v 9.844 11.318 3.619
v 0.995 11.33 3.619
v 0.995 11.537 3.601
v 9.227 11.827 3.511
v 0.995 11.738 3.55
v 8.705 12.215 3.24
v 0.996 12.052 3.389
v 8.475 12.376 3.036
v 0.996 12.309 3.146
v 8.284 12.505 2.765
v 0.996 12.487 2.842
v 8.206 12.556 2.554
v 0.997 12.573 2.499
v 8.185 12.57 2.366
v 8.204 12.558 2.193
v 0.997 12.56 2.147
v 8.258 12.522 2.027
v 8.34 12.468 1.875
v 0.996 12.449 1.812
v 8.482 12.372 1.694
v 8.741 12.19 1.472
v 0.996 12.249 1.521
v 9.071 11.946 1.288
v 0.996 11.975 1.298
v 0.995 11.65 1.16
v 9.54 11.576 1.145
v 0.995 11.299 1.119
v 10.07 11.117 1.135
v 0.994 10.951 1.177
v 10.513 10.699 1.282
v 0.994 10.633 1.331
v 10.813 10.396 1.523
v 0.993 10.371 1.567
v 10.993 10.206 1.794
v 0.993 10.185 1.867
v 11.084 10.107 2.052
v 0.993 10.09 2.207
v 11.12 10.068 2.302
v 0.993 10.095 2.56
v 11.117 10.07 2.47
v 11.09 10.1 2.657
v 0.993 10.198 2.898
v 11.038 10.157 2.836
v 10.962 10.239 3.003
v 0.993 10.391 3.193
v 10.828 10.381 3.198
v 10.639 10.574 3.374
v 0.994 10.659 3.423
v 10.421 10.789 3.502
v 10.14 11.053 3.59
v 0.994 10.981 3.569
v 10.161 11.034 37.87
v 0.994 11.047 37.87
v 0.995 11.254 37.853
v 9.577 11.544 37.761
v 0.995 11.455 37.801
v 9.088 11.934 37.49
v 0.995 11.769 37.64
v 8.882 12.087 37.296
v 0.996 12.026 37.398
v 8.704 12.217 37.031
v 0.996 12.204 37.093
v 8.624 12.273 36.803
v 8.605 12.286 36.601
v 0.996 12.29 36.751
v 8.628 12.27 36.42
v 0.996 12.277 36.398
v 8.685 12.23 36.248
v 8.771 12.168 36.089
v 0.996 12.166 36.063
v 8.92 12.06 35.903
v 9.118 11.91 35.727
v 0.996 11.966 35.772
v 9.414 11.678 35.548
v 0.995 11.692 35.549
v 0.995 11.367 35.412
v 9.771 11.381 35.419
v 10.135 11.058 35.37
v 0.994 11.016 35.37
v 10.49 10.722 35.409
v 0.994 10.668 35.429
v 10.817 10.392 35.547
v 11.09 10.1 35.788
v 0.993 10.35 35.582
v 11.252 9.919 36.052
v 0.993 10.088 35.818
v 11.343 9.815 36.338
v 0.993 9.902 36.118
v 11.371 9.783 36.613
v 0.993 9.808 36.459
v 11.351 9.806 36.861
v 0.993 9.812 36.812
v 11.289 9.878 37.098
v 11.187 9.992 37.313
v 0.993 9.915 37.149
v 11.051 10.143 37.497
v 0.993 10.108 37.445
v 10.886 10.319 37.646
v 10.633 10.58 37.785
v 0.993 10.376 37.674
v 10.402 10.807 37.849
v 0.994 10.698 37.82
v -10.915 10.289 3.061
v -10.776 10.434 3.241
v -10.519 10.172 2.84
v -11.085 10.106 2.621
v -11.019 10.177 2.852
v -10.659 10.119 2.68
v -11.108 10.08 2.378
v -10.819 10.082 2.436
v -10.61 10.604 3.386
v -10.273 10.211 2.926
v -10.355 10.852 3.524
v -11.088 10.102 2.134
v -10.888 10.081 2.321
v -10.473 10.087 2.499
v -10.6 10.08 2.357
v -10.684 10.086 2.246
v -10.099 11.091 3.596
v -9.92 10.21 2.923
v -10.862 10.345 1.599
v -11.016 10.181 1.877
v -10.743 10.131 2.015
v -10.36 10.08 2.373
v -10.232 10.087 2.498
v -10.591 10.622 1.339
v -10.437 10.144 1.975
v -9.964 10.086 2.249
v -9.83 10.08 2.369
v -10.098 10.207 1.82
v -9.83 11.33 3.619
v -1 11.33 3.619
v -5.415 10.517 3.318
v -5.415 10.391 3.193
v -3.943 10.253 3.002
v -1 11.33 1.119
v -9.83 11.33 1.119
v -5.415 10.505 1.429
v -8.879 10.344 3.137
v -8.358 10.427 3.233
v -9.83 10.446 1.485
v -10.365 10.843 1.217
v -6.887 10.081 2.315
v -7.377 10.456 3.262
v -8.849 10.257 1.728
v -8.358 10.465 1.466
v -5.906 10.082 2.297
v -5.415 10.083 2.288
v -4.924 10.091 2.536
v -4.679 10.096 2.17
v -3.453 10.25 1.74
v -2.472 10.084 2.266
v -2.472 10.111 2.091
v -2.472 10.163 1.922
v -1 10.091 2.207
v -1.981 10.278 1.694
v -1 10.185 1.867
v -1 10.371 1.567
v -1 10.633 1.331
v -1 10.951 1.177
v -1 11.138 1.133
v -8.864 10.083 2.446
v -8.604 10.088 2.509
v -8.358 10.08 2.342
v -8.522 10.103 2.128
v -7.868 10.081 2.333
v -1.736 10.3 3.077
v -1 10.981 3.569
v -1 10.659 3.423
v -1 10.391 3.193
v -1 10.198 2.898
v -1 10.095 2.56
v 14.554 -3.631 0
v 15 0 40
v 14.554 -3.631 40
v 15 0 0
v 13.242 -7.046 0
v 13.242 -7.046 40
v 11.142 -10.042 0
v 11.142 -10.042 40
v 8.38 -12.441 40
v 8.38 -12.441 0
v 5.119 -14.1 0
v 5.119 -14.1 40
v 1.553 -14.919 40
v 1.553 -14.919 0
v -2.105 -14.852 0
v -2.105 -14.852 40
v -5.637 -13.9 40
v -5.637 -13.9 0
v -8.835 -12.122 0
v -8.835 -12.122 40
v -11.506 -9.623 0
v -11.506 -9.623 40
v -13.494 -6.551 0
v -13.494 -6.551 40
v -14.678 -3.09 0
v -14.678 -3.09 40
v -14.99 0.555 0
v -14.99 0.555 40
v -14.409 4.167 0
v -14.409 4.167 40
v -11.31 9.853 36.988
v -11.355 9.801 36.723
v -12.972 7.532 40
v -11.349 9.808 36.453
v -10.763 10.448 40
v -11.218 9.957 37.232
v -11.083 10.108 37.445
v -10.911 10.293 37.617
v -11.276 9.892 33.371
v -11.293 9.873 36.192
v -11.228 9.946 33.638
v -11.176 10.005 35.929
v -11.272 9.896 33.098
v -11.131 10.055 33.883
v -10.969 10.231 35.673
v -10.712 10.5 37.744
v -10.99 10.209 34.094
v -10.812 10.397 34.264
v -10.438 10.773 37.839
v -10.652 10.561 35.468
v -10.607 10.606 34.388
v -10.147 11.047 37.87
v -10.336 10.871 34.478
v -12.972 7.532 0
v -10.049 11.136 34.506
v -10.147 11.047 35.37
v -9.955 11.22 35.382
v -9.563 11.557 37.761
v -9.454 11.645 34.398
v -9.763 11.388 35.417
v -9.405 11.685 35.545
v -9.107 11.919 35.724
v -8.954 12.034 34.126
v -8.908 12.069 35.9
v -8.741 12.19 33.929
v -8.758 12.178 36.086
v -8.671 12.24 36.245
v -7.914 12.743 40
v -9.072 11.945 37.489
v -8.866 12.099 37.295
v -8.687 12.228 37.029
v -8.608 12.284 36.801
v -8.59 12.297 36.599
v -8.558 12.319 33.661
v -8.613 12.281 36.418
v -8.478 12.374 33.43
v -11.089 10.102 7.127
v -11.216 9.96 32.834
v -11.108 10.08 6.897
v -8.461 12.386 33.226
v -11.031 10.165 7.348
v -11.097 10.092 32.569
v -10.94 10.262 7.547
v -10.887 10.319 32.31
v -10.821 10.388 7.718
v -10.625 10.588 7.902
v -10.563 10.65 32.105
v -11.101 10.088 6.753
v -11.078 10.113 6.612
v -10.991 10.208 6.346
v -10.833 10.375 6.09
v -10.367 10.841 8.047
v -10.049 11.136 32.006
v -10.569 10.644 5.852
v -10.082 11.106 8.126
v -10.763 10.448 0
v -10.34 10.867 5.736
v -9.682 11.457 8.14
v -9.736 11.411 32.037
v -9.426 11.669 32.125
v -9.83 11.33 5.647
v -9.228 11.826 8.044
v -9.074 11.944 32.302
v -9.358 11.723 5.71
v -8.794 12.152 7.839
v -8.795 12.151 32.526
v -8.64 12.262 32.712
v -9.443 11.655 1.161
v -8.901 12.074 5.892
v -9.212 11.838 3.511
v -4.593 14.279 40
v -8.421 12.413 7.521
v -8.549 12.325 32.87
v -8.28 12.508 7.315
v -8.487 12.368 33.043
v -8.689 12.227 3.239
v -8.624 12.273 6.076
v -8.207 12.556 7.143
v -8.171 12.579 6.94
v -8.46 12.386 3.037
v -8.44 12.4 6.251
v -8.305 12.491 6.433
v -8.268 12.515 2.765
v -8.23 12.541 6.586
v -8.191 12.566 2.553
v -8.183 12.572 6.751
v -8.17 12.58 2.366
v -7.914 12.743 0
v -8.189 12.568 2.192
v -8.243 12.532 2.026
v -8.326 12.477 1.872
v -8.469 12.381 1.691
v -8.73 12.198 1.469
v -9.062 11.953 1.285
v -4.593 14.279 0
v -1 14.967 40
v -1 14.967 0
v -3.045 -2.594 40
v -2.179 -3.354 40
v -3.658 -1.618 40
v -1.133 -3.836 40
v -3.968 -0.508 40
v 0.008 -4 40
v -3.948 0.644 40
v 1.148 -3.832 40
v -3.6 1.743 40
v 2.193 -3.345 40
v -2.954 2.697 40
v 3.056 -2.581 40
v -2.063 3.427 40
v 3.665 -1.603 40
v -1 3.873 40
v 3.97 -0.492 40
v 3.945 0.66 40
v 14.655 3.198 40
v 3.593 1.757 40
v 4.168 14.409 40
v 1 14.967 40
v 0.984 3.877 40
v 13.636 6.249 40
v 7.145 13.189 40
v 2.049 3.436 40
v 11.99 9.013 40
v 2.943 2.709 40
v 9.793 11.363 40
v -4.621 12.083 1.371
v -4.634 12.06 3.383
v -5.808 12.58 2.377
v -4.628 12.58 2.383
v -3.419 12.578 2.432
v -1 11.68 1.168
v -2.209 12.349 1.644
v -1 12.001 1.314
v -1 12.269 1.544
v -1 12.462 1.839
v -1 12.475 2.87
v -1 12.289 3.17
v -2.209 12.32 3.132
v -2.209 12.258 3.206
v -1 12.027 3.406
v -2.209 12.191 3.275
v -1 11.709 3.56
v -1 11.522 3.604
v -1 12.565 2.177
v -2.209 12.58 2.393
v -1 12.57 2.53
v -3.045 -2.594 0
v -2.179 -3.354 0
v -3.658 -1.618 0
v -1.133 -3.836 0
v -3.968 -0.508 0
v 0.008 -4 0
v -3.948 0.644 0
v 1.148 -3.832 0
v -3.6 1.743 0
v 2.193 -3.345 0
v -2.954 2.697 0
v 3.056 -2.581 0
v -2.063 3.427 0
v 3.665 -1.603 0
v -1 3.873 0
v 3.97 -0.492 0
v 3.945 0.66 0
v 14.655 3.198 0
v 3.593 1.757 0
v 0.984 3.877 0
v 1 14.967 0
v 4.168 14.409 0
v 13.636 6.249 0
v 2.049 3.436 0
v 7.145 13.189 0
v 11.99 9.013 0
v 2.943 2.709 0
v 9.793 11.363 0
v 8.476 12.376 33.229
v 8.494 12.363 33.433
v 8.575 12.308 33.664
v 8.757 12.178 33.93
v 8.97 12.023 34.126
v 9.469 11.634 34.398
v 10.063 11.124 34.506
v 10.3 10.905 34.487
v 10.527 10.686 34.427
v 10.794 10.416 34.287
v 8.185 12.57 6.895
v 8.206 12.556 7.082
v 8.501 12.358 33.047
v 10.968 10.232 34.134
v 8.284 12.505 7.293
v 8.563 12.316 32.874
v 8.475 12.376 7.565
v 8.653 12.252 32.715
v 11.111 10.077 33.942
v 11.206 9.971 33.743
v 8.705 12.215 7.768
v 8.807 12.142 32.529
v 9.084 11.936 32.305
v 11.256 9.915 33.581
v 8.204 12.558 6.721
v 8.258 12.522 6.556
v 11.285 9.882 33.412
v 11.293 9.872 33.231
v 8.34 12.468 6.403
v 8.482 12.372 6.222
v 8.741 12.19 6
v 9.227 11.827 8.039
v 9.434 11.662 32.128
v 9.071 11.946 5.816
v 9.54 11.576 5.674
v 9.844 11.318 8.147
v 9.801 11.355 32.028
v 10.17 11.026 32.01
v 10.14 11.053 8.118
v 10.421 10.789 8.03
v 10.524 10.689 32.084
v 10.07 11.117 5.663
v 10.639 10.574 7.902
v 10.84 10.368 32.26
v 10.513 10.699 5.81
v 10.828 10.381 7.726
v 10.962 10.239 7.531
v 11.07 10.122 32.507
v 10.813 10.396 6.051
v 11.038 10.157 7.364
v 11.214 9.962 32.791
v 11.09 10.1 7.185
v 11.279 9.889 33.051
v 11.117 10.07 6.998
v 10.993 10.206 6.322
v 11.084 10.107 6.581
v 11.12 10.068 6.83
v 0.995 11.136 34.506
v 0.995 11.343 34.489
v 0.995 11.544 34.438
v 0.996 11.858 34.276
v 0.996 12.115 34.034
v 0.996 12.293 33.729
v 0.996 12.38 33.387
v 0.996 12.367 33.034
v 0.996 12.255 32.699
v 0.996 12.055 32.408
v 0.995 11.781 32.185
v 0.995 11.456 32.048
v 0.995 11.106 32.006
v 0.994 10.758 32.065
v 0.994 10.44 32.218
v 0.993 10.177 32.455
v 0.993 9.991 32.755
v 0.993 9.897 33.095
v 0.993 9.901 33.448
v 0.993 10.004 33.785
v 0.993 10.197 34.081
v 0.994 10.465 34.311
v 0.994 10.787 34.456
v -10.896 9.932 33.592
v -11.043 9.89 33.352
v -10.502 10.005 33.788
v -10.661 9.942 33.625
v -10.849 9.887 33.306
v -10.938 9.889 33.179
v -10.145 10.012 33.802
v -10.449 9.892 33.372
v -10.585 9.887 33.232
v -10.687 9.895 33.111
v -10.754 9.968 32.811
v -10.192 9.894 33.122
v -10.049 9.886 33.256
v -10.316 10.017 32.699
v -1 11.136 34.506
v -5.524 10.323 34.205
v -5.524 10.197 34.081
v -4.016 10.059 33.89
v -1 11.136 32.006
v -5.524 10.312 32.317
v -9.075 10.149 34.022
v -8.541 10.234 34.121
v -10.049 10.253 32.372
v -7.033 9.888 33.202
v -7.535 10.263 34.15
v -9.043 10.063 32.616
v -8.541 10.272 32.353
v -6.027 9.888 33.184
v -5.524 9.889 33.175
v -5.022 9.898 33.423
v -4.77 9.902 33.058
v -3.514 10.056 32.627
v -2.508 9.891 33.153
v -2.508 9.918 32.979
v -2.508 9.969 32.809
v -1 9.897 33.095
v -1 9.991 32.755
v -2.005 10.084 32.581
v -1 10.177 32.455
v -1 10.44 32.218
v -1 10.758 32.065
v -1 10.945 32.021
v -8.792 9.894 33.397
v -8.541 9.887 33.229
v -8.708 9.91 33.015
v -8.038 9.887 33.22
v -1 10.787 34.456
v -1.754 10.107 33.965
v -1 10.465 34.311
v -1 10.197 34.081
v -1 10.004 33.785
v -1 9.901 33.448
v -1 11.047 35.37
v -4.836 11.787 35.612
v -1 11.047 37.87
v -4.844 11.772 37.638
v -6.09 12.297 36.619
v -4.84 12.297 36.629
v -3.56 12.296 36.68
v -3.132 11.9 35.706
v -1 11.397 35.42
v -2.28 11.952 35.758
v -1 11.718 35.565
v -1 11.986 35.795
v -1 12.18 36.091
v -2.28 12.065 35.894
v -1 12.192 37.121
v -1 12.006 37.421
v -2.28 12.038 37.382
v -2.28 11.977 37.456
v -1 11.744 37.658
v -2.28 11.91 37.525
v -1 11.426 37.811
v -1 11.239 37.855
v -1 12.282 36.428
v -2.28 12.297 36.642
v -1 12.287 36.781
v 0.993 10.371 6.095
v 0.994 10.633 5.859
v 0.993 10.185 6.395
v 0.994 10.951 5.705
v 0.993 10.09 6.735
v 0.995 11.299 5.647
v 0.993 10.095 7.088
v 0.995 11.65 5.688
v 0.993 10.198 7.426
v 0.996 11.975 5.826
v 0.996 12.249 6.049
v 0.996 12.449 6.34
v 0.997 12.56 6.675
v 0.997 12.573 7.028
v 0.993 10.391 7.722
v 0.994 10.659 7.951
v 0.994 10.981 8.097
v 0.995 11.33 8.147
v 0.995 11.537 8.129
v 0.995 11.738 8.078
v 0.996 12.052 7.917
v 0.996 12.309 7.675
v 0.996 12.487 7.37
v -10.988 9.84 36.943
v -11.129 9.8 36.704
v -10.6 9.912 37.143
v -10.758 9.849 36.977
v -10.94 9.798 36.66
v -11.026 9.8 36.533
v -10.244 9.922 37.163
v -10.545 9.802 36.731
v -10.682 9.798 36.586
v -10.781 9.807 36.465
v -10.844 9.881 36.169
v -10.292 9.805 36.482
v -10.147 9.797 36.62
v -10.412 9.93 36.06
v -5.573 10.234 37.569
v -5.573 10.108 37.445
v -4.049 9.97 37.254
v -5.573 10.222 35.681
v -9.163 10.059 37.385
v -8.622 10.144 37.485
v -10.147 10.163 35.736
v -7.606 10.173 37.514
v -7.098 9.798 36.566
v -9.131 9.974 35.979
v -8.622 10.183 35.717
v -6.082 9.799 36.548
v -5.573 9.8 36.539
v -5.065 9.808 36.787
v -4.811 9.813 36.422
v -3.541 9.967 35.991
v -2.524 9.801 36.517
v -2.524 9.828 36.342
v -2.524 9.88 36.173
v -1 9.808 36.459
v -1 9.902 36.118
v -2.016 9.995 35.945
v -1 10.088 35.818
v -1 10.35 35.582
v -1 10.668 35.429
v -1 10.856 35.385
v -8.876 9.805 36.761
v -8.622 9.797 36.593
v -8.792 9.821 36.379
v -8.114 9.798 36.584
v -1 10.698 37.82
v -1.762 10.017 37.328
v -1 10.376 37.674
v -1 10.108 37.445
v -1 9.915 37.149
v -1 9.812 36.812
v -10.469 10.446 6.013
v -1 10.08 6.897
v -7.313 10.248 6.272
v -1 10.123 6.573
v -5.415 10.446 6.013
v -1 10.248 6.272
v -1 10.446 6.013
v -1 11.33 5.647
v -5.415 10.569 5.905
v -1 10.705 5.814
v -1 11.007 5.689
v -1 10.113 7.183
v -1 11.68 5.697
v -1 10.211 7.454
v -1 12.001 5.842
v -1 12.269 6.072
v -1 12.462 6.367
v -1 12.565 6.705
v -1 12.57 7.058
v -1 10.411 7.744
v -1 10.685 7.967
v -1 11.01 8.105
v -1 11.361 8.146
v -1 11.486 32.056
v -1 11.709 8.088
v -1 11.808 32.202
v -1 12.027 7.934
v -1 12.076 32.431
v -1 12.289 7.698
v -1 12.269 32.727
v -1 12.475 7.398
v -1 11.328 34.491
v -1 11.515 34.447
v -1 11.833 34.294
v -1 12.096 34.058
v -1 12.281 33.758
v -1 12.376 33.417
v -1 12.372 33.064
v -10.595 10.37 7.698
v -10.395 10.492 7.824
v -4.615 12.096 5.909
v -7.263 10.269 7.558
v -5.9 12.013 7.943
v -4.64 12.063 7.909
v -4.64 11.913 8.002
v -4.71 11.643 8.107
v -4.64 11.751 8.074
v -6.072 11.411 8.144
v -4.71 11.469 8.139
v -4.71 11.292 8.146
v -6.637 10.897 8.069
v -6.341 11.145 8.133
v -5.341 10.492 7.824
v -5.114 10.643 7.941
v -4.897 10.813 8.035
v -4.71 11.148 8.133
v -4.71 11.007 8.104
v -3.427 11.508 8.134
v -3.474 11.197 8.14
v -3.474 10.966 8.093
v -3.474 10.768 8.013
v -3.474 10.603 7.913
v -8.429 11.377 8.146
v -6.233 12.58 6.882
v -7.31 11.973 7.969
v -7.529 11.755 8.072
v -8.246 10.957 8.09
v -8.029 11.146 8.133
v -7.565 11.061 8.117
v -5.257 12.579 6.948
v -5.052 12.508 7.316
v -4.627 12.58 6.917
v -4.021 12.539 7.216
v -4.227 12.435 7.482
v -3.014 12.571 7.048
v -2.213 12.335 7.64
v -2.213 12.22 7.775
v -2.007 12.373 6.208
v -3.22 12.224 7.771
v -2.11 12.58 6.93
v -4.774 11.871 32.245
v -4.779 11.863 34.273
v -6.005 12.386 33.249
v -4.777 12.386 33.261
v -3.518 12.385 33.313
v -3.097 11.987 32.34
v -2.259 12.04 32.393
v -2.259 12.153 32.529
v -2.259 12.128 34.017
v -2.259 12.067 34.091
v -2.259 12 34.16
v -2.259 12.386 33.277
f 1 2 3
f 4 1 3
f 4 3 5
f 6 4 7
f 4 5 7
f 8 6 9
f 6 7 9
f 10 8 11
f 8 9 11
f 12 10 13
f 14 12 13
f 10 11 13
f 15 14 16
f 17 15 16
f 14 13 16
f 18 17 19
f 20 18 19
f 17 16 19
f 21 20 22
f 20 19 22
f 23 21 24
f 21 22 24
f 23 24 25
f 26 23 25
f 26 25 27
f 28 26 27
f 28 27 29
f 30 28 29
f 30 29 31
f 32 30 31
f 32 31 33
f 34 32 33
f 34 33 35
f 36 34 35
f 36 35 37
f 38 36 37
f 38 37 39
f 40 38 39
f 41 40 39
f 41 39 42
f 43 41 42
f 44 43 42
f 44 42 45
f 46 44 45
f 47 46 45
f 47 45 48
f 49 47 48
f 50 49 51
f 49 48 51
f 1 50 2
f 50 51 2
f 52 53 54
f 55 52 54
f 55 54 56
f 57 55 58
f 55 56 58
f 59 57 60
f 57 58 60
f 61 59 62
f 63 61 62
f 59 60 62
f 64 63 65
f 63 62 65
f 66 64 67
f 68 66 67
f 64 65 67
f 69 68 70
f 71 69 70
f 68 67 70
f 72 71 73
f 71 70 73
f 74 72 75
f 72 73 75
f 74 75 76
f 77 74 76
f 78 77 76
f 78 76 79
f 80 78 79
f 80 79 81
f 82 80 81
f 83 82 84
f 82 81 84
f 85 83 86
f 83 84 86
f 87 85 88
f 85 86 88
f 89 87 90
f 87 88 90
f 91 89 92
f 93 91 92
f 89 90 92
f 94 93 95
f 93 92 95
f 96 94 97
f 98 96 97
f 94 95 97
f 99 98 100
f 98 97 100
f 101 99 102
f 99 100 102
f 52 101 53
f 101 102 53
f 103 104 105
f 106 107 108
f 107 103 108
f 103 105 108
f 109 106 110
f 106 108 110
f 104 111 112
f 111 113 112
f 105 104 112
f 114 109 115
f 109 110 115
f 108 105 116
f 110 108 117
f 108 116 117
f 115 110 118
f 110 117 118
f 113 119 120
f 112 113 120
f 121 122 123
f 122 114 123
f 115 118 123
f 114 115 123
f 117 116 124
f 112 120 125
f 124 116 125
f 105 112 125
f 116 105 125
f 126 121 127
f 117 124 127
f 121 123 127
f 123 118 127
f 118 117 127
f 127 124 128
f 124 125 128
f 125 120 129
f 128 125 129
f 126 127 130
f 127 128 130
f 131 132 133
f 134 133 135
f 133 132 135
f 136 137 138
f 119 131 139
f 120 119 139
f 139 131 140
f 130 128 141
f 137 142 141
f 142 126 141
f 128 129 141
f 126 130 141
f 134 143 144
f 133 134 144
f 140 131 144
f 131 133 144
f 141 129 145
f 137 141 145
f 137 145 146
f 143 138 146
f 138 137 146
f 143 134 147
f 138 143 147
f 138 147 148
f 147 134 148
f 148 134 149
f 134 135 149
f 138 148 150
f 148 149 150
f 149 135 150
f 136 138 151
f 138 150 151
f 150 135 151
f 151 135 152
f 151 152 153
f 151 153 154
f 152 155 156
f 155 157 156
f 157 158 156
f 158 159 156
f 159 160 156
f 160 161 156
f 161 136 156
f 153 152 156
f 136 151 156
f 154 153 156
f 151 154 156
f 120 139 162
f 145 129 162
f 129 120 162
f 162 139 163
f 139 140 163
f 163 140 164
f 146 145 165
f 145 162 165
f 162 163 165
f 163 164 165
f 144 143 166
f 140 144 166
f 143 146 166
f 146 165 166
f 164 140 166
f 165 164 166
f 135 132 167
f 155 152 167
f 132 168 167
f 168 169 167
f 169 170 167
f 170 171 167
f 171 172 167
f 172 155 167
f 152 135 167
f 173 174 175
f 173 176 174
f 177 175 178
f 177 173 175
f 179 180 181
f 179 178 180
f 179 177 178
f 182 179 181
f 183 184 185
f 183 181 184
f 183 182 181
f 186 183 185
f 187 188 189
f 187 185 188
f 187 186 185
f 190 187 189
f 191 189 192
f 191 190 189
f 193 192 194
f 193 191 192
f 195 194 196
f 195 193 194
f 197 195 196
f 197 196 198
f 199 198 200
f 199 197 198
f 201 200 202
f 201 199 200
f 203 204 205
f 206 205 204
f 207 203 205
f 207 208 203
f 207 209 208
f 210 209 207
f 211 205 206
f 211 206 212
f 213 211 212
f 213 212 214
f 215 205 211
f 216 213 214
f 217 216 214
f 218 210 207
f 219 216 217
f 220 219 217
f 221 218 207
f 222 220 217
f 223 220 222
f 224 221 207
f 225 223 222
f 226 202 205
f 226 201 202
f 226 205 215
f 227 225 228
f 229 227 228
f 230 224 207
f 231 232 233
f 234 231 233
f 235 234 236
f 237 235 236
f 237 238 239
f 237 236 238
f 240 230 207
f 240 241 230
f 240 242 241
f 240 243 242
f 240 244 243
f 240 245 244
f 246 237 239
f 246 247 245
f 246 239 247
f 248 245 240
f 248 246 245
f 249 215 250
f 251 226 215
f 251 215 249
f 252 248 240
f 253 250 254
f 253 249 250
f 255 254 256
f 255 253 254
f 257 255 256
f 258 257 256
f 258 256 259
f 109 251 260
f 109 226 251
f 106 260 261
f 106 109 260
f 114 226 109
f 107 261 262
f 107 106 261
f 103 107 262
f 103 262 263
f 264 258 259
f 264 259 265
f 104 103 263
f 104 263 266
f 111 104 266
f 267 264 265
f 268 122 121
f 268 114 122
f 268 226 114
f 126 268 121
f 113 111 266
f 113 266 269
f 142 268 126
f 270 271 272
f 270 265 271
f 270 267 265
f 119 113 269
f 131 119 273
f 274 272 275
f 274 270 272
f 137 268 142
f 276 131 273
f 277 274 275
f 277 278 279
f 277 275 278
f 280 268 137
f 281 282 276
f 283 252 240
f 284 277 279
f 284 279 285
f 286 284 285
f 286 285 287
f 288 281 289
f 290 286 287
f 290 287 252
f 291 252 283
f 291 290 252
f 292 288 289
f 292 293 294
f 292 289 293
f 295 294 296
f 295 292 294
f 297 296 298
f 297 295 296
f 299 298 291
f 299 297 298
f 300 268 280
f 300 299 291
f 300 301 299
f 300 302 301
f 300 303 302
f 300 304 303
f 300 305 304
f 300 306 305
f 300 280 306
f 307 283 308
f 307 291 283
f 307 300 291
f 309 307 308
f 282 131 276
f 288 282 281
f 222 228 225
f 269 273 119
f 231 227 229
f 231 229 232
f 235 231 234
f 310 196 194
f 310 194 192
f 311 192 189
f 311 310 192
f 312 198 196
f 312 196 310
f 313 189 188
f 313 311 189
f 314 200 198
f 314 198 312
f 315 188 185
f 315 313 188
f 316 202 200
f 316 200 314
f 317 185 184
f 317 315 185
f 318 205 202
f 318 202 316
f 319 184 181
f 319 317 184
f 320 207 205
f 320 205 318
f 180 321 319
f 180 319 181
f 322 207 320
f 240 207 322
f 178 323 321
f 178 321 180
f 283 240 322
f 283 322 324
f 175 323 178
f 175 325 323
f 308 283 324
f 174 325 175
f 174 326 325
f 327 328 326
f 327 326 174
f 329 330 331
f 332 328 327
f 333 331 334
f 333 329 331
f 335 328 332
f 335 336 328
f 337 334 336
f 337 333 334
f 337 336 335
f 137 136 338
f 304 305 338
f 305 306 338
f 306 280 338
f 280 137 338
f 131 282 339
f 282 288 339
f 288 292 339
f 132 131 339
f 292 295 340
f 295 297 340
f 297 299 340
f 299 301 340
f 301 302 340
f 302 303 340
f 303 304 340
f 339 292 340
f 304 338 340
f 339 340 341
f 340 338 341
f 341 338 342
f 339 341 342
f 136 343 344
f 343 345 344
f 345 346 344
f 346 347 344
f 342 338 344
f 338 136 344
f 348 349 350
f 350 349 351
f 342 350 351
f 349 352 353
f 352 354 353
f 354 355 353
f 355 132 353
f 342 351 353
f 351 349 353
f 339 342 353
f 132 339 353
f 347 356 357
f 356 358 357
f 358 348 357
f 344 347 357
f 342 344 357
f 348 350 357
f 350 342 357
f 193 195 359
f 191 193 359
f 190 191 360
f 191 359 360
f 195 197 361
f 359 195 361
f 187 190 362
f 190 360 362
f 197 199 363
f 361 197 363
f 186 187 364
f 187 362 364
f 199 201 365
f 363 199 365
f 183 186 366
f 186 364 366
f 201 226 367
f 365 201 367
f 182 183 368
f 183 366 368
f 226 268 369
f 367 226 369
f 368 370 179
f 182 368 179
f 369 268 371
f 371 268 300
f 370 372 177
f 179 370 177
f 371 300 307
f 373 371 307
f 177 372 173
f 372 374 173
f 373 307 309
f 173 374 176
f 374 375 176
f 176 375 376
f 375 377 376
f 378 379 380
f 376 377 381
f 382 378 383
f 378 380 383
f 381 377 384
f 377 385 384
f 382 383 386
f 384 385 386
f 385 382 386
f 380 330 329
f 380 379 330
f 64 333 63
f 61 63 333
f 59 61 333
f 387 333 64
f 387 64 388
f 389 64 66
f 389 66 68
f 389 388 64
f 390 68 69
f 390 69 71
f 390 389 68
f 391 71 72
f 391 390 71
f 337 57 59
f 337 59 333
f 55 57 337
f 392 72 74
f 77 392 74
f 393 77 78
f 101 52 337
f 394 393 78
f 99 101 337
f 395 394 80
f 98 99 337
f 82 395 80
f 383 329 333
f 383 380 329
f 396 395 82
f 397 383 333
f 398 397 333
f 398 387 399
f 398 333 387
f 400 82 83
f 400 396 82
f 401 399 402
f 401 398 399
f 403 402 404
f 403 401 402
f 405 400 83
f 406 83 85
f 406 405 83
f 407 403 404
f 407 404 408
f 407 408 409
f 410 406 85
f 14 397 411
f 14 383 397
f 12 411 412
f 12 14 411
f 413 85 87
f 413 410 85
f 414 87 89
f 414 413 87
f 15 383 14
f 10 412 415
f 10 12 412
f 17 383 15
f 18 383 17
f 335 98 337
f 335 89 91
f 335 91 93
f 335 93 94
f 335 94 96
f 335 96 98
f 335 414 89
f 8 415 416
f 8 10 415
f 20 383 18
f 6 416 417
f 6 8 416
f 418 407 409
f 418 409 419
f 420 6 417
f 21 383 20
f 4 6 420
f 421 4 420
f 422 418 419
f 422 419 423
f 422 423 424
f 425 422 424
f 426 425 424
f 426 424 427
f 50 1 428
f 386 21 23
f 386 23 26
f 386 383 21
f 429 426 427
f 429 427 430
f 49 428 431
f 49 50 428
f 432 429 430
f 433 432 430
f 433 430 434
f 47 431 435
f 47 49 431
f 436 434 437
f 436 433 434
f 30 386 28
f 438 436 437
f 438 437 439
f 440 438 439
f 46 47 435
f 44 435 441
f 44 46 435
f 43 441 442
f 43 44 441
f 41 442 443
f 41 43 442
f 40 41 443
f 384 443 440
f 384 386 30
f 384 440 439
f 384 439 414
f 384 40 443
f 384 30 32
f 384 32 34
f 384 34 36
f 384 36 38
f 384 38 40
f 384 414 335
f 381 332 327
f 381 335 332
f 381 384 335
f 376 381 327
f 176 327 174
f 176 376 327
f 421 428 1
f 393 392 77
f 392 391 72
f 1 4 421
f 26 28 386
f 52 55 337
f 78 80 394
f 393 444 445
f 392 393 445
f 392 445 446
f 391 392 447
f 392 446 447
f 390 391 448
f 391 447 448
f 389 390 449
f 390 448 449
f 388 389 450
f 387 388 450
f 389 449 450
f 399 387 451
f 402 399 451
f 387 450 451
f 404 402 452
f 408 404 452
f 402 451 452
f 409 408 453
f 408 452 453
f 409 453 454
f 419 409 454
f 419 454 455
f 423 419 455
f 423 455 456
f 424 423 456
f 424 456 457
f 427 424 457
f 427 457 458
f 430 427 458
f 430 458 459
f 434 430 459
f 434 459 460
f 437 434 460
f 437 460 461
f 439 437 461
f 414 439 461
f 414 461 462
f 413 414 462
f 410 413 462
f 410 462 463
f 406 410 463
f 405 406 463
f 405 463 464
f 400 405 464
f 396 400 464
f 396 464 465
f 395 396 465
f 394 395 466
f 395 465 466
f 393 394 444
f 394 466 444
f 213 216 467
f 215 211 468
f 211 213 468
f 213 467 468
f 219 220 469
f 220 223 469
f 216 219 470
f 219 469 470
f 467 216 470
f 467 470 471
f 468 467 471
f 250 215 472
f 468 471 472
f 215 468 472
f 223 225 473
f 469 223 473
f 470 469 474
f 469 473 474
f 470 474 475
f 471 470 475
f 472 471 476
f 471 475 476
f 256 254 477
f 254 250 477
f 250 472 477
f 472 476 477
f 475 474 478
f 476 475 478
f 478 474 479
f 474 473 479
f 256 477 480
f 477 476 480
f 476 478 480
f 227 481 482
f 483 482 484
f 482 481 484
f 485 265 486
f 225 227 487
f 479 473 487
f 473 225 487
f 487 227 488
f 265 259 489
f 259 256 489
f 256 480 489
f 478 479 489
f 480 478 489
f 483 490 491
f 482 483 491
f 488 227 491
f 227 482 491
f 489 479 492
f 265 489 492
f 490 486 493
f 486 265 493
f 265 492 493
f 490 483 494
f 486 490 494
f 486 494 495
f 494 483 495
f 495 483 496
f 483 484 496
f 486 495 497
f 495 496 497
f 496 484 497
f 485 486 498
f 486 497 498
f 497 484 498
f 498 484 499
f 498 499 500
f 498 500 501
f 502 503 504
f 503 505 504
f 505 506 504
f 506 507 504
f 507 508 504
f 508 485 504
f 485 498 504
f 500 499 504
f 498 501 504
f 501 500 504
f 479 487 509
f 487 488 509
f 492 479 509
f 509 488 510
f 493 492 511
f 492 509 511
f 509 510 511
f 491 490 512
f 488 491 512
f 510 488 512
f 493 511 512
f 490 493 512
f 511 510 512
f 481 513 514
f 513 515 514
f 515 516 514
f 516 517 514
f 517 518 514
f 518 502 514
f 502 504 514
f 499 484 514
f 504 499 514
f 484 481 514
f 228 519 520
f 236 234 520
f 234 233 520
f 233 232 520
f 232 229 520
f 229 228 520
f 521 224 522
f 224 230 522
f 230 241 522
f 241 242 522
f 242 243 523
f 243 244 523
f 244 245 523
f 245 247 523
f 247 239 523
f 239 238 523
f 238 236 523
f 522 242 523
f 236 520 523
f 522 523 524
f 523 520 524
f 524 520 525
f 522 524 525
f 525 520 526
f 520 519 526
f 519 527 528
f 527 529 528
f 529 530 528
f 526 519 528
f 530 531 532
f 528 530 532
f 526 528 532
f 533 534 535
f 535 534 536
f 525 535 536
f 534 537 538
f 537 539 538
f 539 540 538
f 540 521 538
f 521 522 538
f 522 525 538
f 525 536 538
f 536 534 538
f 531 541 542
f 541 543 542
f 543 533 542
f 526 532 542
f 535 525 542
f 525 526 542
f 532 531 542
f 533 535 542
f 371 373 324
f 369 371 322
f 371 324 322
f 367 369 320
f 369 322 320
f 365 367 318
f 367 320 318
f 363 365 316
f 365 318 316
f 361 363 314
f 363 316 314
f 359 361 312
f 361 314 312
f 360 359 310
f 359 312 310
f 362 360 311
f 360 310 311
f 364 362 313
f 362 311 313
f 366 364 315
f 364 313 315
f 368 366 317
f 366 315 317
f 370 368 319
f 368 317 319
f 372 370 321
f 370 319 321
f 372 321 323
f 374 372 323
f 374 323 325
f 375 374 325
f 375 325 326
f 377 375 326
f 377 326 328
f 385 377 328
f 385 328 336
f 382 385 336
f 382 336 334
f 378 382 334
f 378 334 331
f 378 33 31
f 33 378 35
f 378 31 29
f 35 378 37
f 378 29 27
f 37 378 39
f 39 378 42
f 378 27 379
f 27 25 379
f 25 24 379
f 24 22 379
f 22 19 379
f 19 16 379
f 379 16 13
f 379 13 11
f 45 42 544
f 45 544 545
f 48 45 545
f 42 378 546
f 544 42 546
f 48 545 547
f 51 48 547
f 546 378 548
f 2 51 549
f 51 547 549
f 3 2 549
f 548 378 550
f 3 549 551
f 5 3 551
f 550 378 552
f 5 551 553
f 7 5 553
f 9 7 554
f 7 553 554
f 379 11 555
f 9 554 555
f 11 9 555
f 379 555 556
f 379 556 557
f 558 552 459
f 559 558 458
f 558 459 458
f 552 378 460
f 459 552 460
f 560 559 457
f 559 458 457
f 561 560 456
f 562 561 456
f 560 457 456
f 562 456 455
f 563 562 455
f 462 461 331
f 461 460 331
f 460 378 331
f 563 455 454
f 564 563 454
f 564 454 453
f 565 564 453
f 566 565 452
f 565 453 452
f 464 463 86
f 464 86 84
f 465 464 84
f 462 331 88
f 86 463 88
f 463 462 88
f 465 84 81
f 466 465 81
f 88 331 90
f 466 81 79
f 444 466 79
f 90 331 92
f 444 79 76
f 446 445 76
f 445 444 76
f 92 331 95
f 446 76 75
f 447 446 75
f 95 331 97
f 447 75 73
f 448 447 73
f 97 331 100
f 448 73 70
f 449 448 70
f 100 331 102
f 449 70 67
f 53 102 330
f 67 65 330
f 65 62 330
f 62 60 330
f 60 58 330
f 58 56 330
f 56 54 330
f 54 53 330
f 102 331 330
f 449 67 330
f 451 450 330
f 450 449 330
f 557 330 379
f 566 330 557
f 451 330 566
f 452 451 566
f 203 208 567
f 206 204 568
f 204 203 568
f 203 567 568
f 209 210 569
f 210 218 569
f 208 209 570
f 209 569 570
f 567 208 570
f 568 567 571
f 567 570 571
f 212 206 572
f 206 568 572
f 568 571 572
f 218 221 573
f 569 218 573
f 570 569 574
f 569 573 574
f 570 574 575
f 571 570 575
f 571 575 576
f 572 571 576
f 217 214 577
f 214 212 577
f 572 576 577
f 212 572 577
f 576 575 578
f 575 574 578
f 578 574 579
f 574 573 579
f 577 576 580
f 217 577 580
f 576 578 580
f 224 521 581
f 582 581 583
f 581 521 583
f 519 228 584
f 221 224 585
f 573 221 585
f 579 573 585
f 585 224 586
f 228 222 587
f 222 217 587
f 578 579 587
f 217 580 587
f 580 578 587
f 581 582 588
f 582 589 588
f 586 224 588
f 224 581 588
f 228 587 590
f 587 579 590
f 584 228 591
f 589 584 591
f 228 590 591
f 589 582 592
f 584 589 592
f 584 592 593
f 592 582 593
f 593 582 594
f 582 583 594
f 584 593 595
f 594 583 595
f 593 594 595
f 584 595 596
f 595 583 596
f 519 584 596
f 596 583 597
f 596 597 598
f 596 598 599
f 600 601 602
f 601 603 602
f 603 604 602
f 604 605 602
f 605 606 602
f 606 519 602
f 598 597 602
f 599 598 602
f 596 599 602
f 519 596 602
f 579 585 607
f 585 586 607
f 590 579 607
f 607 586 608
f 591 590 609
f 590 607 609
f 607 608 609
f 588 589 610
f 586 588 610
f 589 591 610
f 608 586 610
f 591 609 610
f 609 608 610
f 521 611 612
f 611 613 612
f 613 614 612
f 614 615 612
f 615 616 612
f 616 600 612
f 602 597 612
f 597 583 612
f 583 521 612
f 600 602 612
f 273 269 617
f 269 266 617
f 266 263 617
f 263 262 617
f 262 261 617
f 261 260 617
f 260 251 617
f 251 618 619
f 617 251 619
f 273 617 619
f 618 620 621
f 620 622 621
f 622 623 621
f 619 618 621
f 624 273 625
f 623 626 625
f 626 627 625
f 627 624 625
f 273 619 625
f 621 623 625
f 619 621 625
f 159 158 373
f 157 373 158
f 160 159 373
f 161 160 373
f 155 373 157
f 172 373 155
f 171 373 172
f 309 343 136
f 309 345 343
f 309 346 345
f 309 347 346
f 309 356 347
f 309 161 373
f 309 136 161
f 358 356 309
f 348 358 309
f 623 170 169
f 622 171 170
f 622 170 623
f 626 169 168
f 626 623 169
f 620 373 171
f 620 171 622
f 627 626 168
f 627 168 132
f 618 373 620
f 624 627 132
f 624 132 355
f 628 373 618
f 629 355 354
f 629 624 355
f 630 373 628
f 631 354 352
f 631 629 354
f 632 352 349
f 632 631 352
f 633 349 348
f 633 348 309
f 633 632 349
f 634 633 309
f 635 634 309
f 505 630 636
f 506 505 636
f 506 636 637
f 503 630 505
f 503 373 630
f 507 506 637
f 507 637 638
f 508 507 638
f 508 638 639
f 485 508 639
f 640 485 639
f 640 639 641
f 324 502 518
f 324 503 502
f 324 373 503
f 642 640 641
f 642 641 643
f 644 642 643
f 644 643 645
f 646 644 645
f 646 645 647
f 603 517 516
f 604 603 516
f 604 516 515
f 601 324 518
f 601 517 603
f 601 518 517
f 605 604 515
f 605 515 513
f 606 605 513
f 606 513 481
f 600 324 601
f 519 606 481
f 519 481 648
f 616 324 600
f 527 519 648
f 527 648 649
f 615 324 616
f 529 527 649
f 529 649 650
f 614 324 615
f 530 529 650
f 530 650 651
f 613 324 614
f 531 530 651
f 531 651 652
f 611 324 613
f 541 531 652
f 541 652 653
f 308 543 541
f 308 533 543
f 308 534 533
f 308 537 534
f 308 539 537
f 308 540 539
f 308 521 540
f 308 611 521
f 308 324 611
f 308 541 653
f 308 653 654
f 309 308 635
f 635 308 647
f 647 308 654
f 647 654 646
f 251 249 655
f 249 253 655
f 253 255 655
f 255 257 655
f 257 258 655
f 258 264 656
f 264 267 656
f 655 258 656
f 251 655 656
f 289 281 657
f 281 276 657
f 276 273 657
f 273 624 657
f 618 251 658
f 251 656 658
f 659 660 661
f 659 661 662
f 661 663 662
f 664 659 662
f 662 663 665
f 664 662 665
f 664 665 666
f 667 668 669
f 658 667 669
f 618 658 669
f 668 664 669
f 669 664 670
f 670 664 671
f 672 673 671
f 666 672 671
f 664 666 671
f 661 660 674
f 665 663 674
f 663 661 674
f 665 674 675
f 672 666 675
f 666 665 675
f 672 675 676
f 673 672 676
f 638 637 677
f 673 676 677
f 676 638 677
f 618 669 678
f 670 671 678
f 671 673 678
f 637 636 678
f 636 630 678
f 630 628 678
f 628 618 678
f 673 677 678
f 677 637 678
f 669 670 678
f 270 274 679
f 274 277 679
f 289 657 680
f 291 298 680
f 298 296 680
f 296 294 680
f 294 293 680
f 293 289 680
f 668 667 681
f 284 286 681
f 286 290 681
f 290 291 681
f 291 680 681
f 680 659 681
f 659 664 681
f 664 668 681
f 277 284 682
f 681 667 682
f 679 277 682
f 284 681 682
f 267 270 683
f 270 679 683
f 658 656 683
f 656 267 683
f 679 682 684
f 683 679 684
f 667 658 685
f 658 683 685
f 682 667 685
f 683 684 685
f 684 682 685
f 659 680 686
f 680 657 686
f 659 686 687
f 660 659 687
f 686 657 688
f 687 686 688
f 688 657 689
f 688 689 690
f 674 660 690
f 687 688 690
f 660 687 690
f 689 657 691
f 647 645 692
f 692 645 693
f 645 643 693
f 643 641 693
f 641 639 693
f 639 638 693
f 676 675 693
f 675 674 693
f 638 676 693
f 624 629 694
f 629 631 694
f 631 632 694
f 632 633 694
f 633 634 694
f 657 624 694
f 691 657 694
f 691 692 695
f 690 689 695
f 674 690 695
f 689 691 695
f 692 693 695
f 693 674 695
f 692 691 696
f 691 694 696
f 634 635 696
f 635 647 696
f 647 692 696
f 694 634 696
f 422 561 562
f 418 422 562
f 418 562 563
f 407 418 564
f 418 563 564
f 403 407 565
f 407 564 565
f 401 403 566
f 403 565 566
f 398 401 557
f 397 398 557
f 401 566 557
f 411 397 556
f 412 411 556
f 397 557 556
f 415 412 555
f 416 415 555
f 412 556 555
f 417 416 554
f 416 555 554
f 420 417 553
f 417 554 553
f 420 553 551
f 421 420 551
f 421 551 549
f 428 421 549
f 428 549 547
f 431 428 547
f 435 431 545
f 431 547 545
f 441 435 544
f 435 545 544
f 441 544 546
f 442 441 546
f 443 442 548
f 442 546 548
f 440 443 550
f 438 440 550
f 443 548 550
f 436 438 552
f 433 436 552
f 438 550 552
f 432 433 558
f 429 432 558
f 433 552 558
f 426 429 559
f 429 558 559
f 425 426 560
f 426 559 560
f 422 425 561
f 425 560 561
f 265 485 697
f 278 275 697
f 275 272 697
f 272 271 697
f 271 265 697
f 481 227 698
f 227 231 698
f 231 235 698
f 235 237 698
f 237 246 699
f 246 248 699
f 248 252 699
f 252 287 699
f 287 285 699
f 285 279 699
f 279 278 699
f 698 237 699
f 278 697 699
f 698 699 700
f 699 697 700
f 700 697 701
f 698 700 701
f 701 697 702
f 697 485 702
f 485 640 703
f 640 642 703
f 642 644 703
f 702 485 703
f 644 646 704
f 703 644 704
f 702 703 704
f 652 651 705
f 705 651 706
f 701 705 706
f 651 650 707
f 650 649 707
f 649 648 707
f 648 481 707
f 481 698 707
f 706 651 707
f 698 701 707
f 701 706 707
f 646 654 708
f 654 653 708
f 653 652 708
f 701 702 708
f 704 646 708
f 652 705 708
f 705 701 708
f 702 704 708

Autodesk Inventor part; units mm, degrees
ref_plane "YZ Plane" through (0, 0, 0) normal (1, 0, 0) x (0, 1, 0)
ref_plane "XZ Plane" through (0, 0, 0) normal (0, 1, 0) x (-1, 0, 0)
ref_plane "XY Plane" through (0, 0, 0) normal (0, 0, 1) x (1, 0, 0)
sketch "Sketch1" plane through (0, 0, 0) normal (0, 0, 1) x (1, 0, 0)
  circle A0 centre (0, 0) radius 15
  dimension "d0" = 30
extrude "Extrusion1" add sketch "Sketch1" along normal blind 40
sketch "Sketch2" plane through (0, 0, 40) normal (0, 0, 1) x (1, 0, 0)
  circle A0 centre (0, 0) radius 4
  dimension "d3" = 8
extrude "Extrusion2" cut sketch "Sketch2" against normal blind 40
sketch "Sketch3" plane through (0, 0, 40) normal (0, 0, 1) x (1, 0, 0)
  circle A0 centre (0, 0) radius 4 projected
  circle A1 centre (0, 0) radius 15 projected
  line L0 (0, 15) -> (1, 15)
  line L1 (0, 15) -> (-1, 15)
  line L2 (-0.0081, 4) -> (0.9843, 3.877)
  line L3 (-0.0081, 4) -> (-1, 3.873)
  line L4 (-1, 3.873) -> (-1, 15)
  line L5 (0.9843, 3.877) -> (1, 15)
  dimension "d8" = 1
  dimension "d9" = 1
  dimension "d10" = 1
  dimension "d11" = 1
extrude "Extrusion3" cut sketch "Sketch3" against normal blind 40 contours L2 A0 | A0 L4 A1 L5 | A0 L3 | A1 L0 L5 | L4 L1 A1 picked at (-0.339, 7.6568)
sketch "Sketch4" plane through (0, 0, 40) normal (0, 0, 1) x (1, 0, 0)
  point P0 (0, 0)
sketch "Sketch5" plane through (1, 14.9666, 0) normal (-1, 0.0014, 0) x (0, 0, 1)
  point P0 (0, -14.968)
sketch "Sketch6" plane through (1, 14.9666, 0) normal (-1, 0.0014, 0) x (0, 0, 1)
  circle A0 centre (36.6199, -3.9195) radius 1.25
  point P0 (0, -14.968)
  dimension "d14" = 2.5
extrude "Extrusion4" cut sketch "Sketch6" against normal blind 15
sketch "Sketch7" plane through (1, 14.9666, 0) normal (-1, 0.0014, 0) x (0, 0, 1)
  circle A0 centre (33.2561, -3.8302) radius 1.25
  point P0 (0, -14.968)
  dimension "d17" = 2.5
extrude "Extrusion5" cut sketch "Sketch7" against normal blind 15
sketch "Sketch8" plane through (1, 14.9666, 0) normal (-1, 0.0014, 0) x (0, 0, 1)
  circle A0 centre (6.8967, -3.6366) radius 1.25
  circle A1 centre (2.3686, -3.6366) radius 1.25
  point P0 (0, -14.968)
  dimension "d20" = 2.5
  dimension "d21" = 2.5
extrude "Extrusion6" cut sketch "Sketch8" against normal blind 30
sketch "Sketch9" plane through (-1, 3.873, 40) normal (1, 0, 0) x (0, 0, -1)
  point P0 (40, -3.873)
sketch "Sketch10" plane through (-1, 3.873, 40) normal (1, 0, 0) x (0, 0, -1)
  ellipse E0 centre (33.1033, 7.4571) end of major axis (31.8533, 7.4571) minor radius 1.25 projected
  circle A0 centre (33.1033, 7.4571) radius 1.25
  ellipse E1 centre (37.6314, 7.4571) end of major axis (36.3814, 7.4571) minor radius 1.25 projected
  circle A1 centre (37.6314, 7.4571) radius 1.25
  ellipse E2 centre (6.7439, 7.2634) end of major axis (5.4939, 7.2634) minor radius 1.25 projected
  circle A2 centre (6.7439, 7.2634) radius 1.25
  ellipse E3 centre (3.3801, 7.1742) end of major axis (2.1301, 7.1742) minor radius 1.25 projected
  circle A3 centre (3.3801, 7.1742) radius 1.25
  point P0 (40, -3.873)
  dimension "d24" = 2.5
  dimension "d25" = 2.5
  dimension "d26" = 2.5
  dimension "d27" = 2.5
extrude "Extrusion7" cut sketch "Sketch10" against normal blind 30
properties part number "Acoplador de servomotor"
